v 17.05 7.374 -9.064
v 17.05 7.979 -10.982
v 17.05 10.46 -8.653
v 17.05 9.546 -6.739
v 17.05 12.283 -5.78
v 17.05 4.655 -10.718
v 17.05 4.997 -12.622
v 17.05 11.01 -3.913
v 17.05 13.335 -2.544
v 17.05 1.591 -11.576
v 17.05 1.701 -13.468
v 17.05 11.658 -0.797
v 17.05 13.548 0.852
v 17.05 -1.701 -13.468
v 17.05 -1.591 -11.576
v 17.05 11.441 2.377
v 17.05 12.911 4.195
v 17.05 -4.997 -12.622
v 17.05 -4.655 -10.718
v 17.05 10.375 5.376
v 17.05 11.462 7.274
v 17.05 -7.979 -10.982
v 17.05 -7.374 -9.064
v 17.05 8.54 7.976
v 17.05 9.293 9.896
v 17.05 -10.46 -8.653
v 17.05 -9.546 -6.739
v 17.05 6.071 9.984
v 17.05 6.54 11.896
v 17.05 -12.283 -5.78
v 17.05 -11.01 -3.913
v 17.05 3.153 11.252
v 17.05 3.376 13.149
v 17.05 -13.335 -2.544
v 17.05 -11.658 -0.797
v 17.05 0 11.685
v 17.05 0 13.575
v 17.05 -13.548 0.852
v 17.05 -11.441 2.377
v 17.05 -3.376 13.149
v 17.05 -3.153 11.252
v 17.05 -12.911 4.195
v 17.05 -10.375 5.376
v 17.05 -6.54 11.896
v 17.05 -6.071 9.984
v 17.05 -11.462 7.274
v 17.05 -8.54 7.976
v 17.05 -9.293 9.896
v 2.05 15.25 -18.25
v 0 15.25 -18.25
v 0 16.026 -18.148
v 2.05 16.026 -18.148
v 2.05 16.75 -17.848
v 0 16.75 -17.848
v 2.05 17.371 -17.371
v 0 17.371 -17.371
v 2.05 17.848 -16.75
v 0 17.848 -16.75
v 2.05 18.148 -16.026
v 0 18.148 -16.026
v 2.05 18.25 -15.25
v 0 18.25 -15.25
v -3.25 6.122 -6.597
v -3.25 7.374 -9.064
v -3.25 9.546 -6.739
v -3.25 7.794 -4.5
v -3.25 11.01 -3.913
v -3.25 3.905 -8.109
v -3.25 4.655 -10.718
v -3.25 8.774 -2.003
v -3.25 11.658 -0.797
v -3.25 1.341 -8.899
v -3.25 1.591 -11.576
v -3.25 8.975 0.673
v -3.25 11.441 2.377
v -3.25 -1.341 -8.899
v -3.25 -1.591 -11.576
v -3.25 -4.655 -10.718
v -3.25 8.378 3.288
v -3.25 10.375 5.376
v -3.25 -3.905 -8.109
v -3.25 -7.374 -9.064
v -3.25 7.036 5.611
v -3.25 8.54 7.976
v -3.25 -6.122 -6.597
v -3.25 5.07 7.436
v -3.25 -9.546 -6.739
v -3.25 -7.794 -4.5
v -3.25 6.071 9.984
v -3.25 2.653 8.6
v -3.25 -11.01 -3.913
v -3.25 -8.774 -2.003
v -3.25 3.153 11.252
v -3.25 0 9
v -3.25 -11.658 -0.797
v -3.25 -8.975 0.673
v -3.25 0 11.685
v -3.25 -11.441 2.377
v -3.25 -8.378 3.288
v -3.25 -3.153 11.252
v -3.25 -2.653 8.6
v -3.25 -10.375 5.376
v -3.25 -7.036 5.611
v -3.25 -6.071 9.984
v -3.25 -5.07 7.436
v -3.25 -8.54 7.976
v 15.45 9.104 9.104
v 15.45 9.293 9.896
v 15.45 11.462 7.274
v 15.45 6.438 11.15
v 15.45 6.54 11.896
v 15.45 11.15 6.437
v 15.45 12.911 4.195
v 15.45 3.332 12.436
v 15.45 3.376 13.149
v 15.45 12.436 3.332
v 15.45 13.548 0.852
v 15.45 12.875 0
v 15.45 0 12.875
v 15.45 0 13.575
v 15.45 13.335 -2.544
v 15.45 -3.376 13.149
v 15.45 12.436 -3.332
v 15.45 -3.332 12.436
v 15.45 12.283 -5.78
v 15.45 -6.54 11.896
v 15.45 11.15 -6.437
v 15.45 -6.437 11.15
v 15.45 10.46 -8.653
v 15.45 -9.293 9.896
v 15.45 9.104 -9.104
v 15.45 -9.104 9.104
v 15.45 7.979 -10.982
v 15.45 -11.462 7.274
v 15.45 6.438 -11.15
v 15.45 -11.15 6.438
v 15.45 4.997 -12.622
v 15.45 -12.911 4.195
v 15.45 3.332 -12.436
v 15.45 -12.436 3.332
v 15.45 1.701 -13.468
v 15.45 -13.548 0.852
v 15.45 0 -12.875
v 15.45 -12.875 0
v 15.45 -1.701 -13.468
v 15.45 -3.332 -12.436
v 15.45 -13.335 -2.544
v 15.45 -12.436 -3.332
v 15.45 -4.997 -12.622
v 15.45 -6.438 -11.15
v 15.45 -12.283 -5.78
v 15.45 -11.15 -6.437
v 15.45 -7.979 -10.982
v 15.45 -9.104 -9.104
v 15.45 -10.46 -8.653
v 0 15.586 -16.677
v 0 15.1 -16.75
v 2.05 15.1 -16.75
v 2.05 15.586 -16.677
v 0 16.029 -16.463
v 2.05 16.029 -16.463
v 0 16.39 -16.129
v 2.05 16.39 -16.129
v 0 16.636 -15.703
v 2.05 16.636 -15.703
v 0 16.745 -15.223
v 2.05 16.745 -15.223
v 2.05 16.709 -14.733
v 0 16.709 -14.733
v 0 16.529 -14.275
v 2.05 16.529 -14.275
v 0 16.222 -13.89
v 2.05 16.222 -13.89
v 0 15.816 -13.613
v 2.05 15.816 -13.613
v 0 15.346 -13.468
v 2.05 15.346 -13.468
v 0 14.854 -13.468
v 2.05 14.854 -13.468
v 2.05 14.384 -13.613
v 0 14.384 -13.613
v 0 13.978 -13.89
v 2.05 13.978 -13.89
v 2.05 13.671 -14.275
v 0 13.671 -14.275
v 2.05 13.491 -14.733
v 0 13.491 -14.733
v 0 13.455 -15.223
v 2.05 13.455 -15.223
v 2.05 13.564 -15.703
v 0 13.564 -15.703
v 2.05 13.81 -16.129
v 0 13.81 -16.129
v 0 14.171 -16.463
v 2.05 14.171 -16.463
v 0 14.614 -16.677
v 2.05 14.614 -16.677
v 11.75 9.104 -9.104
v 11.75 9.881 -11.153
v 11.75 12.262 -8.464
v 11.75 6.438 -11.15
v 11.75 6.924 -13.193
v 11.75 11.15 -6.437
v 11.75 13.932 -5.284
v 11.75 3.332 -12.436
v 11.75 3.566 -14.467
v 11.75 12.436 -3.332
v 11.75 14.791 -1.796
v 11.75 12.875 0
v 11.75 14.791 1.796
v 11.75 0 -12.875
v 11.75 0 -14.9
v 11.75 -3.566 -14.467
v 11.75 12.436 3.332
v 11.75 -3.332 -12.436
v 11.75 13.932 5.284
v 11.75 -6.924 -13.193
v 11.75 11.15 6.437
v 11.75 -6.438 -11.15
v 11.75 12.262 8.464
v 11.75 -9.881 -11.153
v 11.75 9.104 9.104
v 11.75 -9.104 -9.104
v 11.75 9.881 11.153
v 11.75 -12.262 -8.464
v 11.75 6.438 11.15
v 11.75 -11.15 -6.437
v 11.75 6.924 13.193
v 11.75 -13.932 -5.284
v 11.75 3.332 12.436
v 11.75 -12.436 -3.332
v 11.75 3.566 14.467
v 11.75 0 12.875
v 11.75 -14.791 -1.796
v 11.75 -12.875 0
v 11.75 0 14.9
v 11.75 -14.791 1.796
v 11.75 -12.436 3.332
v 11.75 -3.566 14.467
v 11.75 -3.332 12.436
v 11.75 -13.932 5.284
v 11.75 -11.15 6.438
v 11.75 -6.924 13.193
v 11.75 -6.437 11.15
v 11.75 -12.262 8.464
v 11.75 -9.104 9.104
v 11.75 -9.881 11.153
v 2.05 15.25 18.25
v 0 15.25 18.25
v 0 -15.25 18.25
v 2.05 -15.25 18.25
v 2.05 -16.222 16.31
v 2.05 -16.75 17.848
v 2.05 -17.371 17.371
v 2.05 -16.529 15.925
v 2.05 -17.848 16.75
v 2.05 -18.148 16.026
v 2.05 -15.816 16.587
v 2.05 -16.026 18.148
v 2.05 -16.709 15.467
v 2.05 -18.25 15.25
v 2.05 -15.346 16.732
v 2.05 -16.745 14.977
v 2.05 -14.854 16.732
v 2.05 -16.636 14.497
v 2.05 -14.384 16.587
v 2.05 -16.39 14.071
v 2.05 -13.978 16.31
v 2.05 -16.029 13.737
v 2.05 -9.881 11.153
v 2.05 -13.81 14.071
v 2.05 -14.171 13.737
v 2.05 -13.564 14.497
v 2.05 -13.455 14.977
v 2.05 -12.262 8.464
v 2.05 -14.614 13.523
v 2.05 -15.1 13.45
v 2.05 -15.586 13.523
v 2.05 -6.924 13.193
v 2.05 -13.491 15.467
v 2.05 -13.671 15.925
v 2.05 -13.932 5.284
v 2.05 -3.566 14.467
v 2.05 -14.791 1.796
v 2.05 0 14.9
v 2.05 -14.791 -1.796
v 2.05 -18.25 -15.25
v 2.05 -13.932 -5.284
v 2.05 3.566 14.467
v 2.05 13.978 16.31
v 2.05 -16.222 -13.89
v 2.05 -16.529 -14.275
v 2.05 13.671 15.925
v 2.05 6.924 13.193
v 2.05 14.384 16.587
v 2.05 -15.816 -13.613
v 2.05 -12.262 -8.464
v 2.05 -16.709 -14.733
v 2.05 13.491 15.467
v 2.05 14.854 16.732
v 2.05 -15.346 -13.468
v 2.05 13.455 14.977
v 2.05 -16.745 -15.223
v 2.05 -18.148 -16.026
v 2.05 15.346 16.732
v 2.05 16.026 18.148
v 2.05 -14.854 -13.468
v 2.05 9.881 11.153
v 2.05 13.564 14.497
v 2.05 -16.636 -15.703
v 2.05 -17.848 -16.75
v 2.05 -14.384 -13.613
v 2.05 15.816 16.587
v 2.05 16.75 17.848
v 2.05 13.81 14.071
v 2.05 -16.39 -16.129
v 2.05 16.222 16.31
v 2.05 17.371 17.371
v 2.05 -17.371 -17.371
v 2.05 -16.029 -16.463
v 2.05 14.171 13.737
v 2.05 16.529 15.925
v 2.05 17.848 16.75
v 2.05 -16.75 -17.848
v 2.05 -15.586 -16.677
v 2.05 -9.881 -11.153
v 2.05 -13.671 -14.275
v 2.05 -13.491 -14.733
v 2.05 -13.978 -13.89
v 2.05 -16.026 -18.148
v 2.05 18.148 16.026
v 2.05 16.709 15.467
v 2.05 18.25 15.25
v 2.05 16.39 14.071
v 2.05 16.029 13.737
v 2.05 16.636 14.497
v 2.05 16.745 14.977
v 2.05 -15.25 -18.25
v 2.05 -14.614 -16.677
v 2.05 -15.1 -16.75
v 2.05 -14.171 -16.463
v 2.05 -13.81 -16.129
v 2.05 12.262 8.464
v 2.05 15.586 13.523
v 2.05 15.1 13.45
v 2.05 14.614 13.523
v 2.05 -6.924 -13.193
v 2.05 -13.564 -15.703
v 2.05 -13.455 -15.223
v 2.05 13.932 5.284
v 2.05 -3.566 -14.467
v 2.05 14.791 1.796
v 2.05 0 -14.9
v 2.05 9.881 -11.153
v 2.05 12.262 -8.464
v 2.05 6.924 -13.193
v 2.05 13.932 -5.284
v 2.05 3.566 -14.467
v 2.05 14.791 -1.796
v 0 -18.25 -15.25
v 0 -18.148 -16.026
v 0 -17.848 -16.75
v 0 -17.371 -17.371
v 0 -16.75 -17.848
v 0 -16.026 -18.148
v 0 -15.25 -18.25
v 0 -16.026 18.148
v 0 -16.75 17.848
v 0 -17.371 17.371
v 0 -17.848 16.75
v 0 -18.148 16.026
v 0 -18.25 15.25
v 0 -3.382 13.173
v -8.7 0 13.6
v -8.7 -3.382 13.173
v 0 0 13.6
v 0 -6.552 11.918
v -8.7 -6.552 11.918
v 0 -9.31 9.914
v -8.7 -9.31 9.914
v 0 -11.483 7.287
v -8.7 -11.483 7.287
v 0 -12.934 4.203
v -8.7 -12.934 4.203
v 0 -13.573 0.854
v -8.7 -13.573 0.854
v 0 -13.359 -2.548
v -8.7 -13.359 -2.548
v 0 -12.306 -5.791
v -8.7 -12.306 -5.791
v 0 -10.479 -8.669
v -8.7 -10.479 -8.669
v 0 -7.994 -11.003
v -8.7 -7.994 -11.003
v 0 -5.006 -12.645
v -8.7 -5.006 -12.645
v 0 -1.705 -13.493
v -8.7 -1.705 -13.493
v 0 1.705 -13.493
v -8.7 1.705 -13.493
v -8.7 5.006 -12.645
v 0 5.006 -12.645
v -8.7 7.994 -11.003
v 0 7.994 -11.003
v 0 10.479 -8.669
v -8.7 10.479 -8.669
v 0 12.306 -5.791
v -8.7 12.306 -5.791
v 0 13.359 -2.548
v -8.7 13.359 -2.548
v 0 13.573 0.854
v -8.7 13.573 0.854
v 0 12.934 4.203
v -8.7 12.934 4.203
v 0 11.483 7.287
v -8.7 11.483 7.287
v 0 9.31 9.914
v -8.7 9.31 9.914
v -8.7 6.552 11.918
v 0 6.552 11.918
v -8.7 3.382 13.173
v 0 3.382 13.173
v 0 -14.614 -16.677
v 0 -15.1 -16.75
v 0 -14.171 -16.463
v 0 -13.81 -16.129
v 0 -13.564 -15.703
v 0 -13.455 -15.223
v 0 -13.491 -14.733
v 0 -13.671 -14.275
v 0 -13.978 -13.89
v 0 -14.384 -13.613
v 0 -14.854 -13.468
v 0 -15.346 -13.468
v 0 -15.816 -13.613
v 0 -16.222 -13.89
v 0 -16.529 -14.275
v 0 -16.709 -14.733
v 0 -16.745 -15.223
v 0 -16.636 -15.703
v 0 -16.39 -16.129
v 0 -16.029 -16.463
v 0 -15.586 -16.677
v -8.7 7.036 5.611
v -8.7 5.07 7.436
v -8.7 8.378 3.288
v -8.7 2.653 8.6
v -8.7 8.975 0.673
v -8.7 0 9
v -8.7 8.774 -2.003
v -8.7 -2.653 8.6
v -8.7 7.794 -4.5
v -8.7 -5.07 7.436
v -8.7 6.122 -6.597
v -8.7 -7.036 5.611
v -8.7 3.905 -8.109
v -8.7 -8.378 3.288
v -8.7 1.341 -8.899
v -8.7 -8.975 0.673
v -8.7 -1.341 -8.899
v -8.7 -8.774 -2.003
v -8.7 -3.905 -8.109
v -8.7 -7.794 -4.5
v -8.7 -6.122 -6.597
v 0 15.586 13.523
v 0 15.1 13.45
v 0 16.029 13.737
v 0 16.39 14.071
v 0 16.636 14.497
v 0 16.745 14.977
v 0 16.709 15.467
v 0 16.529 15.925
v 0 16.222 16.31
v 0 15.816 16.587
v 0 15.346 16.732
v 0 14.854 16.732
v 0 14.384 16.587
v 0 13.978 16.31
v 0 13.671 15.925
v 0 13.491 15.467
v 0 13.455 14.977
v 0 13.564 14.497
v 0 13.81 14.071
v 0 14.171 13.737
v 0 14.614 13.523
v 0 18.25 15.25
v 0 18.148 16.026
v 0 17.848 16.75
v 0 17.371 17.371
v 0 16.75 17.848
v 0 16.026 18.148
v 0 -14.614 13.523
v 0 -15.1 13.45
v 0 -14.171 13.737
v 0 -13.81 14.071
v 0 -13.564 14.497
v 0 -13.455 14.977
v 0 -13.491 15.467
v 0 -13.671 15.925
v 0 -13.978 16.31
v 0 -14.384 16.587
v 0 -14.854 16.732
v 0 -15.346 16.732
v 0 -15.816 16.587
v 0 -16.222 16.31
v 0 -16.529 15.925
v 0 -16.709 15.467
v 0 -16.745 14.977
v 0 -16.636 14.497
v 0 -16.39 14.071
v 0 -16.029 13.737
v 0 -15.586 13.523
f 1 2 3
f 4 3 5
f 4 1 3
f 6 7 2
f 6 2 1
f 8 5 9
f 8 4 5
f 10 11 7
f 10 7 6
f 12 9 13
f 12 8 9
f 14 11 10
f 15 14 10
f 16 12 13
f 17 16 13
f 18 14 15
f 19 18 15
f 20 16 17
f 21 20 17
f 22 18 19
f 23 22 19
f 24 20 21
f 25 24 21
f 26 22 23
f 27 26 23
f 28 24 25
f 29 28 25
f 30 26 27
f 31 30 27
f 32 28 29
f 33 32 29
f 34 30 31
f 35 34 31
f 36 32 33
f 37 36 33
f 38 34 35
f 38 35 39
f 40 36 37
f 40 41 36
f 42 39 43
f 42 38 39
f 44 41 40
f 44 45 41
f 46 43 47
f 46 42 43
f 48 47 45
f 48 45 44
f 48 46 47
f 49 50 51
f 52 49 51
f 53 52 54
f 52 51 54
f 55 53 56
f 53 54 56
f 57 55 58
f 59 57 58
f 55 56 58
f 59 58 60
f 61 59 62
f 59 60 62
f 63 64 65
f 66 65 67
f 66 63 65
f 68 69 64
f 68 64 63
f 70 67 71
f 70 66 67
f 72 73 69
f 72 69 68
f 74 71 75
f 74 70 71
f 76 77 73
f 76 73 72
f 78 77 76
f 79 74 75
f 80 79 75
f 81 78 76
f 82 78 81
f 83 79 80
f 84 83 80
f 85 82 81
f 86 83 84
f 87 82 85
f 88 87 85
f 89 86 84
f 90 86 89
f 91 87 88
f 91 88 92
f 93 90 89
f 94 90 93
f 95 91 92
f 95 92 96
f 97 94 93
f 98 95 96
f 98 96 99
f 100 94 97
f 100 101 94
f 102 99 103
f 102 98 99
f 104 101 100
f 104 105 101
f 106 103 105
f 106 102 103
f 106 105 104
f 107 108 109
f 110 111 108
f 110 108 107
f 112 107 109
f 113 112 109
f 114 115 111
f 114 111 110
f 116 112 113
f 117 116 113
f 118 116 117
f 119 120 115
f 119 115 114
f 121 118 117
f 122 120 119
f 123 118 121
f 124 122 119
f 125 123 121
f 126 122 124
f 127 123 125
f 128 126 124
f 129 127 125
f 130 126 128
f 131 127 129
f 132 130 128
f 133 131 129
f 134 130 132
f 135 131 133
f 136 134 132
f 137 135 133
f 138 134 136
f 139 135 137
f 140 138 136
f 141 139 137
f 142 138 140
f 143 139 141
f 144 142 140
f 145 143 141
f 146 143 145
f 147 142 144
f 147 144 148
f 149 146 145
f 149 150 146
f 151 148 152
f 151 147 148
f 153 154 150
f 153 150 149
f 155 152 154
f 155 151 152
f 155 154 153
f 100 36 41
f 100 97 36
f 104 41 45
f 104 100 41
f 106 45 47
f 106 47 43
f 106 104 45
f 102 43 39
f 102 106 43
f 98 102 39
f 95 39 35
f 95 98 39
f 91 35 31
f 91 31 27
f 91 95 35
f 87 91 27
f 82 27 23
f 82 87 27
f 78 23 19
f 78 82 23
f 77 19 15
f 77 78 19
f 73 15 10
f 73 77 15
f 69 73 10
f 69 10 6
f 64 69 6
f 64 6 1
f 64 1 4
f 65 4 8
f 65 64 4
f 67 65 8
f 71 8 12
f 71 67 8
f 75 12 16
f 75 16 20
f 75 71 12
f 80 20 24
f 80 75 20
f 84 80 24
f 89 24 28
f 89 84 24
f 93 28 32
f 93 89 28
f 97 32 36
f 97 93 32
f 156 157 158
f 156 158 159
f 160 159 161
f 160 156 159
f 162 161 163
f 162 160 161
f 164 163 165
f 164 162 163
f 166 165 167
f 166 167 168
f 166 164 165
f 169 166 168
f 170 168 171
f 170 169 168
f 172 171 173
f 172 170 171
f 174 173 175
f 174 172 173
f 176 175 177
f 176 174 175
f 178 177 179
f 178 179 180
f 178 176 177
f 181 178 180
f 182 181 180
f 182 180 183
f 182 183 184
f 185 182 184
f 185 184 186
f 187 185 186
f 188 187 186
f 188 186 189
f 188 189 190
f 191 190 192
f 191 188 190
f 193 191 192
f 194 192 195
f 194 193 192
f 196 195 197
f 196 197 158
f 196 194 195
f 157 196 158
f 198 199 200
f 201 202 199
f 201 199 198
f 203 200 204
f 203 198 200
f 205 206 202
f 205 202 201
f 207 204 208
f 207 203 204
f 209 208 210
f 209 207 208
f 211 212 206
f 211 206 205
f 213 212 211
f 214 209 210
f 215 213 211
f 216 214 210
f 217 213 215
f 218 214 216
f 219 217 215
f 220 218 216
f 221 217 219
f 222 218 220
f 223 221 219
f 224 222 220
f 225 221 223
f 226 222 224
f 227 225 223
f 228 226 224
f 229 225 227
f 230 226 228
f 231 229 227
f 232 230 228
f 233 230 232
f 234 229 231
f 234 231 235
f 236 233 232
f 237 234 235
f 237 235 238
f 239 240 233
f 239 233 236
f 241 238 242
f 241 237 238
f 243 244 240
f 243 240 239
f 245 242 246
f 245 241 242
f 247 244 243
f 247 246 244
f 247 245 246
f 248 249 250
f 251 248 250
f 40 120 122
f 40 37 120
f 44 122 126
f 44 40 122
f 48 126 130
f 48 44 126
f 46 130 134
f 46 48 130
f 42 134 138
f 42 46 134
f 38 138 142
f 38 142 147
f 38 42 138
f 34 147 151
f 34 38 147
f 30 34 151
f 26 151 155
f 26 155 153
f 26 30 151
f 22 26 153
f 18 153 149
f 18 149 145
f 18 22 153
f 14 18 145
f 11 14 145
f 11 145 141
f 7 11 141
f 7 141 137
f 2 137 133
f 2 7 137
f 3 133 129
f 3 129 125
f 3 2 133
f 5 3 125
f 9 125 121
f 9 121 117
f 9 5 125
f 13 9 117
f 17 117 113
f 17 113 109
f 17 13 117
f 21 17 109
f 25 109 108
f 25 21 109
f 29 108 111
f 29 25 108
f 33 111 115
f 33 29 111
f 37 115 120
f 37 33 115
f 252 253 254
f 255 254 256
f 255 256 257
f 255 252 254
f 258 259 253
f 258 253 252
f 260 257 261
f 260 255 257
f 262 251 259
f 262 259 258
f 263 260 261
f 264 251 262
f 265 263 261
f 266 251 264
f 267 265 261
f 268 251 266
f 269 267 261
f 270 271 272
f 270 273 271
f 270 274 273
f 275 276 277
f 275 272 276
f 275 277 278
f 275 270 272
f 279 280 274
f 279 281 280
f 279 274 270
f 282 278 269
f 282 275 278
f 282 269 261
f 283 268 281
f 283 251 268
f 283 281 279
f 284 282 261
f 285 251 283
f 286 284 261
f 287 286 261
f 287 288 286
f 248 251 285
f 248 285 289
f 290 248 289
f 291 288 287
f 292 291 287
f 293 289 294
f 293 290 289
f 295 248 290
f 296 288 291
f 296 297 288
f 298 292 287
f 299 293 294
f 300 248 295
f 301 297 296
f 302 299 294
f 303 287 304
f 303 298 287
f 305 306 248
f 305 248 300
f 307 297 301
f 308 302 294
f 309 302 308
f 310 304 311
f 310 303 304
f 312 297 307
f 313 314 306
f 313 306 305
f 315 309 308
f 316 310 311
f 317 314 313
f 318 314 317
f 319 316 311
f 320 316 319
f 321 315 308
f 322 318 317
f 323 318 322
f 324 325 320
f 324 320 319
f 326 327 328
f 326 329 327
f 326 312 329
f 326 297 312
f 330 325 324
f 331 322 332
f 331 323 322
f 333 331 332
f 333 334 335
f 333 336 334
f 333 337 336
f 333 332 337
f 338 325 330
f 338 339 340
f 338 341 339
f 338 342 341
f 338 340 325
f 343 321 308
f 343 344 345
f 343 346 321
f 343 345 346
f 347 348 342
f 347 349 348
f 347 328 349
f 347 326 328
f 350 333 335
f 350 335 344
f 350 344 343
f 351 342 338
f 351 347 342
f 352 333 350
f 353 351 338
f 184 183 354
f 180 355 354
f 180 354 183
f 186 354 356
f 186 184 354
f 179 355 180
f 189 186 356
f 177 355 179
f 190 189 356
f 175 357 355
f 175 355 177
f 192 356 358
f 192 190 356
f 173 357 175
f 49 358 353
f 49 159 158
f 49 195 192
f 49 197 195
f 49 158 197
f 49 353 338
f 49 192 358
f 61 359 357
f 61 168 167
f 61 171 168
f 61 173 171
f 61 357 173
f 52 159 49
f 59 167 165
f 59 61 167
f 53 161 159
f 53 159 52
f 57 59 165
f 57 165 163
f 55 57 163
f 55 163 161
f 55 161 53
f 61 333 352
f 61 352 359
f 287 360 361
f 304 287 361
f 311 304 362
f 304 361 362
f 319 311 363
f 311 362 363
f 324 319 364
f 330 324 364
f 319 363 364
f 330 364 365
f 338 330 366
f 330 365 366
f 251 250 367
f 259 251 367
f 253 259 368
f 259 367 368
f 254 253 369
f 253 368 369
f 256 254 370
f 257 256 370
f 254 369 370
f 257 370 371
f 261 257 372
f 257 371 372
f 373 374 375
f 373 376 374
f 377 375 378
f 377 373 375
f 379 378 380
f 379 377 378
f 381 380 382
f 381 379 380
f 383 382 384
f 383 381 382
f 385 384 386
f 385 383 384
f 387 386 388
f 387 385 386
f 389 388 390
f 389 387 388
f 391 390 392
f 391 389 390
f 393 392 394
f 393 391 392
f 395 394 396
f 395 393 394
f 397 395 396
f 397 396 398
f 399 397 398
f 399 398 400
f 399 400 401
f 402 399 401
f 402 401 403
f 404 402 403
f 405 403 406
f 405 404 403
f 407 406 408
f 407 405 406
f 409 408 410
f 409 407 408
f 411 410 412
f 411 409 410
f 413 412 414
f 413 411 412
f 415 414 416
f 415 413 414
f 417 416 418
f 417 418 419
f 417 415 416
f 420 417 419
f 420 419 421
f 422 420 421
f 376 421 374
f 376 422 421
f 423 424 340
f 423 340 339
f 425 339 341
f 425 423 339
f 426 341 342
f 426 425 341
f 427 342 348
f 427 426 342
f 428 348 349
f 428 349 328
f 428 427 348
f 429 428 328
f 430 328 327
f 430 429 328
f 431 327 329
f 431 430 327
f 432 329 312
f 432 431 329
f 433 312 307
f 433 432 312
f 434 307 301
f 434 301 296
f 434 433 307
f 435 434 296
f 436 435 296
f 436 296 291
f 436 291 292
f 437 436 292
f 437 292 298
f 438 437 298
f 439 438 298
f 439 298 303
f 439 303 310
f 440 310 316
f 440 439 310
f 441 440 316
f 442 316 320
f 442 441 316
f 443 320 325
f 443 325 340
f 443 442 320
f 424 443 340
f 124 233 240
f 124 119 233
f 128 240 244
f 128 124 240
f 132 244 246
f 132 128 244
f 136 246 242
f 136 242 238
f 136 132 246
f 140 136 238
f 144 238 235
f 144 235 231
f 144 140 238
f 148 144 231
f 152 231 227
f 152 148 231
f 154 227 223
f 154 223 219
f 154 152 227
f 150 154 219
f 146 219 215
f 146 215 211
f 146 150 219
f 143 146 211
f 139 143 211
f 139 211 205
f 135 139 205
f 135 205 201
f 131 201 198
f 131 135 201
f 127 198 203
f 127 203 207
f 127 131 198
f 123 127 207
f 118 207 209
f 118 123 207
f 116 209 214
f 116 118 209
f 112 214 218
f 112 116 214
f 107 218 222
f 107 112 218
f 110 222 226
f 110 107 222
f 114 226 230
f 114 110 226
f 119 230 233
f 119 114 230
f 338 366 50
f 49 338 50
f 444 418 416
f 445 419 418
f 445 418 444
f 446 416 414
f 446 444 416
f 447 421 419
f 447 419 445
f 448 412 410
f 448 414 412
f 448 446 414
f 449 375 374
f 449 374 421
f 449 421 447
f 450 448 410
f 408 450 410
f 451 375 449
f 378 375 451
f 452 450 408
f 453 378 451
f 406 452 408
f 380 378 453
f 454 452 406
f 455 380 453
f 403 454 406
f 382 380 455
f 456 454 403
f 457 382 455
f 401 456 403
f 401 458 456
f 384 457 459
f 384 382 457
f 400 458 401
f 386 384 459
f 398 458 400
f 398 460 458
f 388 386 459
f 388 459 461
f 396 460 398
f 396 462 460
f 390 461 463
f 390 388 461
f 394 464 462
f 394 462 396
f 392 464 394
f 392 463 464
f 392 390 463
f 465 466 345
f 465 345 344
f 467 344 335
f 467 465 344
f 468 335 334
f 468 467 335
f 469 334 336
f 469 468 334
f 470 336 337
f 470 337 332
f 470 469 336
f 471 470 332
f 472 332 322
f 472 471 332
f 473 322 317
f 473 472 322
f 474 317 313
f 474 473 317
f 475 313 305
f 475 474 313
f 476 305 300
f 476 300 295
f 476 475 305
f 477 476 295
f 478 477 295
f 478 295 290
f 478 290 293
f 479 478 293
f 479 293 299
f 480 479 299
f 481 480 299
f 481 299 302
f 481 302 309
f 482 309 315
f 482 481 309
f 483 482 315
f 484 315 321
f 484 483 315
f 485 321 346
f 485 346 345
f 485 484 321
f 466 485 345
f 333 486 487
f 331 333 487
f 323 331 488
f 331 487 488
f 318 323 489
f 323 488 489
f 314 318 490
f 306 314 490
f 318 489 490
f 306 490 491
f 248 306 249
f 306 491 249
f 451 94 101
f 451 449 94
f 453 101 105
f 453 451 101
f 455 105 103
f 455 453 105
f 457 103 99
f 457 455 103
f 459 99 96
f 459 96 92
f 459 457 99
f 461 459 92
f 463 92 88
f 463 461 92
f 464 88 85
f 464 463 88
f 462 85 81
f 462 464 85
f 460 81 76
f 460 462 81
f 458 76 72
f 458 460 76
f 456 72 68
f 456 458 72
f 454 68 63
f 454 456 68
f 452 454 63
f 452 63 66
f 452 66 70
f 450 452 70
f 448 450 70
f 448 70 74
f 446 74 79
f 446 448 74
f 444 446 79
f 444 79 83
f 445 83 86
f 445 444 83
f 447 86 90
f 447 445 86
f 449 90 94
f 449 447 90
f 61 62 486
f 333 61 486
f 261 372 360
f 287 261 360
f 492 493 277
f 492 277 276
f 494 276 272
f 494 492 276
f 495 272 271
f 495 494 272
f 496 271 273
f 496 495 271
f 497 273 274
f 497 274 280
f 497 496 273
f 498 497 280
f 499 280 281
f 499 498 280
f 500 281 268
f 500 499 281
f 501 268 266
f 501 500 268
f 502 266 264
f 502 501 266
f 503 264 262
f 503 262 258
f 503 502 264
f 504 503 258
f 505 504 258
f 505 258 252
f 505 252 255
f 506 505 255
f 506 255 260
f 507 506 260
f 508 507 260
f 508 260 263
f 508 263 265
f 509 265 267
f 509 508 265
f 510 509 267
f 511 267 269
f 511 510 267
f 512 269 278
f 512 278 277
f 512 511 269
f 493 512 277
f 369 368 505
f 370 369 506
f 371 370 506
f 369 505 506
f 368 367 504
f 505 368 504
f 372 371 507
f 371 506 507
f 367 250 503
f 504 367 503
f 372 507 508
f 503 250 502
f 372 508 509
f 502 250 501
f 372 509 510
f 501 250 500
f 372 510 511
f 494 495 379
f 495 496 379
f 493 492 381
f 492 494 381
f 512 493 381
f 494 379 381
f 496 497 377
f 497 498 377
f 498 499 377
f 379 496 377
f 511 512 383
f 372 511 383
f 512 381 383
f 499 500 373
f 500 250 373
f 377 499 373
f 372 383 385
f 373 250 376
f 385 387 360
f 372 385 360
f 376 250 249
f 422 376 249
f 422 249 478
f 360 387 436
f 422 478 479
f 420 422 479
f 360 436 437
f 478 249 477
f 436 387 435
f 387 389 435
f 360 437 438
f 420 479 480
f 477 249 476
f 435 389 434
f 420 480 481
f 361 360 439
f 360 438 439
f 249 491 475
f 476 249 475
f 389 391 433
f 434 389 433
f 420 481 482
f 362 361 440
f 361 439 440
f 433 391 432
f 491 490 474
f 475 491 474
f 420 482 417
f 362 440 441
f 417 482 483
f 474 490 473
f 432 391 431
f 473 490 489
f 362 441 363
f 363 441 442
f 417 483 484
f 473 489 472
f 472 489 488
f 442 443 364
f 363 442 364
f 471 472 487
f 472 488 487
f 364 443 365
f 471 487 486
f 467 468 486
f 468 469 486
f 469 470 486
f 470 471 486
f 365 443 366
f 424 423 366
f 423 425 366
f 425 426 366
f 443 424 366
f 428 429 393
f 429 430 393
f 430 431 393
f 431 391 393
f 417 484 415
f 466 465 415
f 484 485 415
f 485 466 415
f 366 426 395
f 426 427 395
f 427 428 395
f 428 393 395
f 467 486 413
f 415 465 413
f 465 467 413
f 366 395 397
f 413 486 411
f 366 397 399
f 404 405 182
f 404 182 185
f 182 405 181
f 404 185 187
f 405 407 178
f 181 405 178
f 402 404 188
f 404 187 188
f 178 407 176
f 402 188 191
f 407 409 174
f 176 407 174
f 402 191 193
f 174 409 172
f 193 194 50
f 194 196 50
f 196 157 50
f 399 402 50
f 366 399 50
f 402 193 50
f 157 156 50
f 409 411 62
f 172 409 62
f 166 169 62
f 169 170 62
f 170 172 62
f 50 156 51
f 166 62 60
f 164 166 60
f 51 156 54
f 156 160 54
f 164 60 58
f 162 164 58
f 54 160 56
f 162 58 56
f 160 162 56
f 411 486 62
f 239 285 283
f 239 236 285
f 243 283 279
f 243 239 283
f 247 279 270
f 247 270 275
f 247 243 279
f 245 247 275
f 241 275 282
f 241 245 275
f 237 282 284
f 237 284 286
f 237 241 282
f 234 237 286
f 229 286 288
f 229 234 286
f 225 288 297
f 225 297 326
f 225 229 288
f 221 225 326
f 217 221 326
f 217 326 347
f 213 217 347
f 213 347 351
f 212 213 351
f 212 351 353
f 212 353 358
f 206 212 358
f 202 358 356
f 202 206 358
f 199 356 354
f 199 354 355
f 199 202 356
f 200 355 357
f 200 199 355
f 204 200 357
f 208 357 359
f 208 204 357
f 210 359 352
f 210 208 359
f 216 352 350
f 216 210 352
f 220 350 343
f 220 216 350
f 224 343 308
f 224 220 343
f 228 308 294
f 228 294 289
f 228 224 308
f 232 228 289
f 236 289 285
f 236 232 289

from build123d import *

# Parameters (mm, degrees)
CROQUIS1_R              = 1.65
CROQUIS1_R_2            = 14.9
SALIENTE_EXTRUIR1_DEPTH = 2.05


with BuildPart() as part:
    # Croquis1 → Saliente-Extruir1 (new body)
    with BuildSketch(Plane(origin=(0, 0, 0), x_dir=(0, 0, -1), z_dir=(1, 0, 0))):
        with BuildLine():
            Line((-15.25, -18.25), (15.25, -18.25))
            ThreePointArc((15.25, -18.25), (17.371320344, -17.371320344), (18.25, -15.25))
            Line((18.25, -15.25), (18.25, 15.25))
            ThreePointArc((18.25, 15.25), (17.371320344, 17.371320344), (15.25, 18.25))
            Line((15.25, 18.25), (-15.25, 18.25))
            ThreePointArc((-15.25, 18.25), (-17.371320344, 17.371320344), (-18.25, 15.25))
            Line((-18.25, 15.25), (-18.25, -15.25))
            ThreePointArc((-18.25, -15.25), (-17.371320344, -17.371320344), (-15.25, -18.25))
        make_face()
        with Locations((-15.1, 15.1)):
            Circle(CROQUIS1_R, mode=Mode.SUBTRACT)
        with Locations((-15.1, -15.1)):
            Circle(CROQUIS1_R, mode=Mode.SUBTRACT)
        with Locations((15.1, -15.1)):
            Circle(CROQUIS1_R, mode=Mode.SUBTRACT)
        with Locations((15.1, 15.1)):
            Circle(CROQUIS1_R, mode=Mode.SUBTRACT)
        Circle(CROQUIS1_R_2, mode=Mode.SUBTRACT)
    extrude(amount=SALIENTE_EXTRUIR1_DEPTH)

    # Croquis2 → Revolución1 (revolve)
    with BuildSketch(Plane.XY, mode=Mode.PRIVATE) as revoluci_n1_sk:
        Polygon((0, 14.9), (11.75, 14.9), (11.75, 12.875), (15.45, 12.875), (15.45, 13.575), (17.05, 13.575), (17.05, 11.685), (-3.25, 11.685), (-3.25, 9), (-8.7, 9), (-8.7, 13.6), (0, 13.6), align=None)
    revolve(revoluci_n1_sk.sketch.rotate(Axis((0, 0, 0), (1, 0, 0)), 90), axis=Axis((0, 0, 0), (1, 0, 0)))


solid = part.part
